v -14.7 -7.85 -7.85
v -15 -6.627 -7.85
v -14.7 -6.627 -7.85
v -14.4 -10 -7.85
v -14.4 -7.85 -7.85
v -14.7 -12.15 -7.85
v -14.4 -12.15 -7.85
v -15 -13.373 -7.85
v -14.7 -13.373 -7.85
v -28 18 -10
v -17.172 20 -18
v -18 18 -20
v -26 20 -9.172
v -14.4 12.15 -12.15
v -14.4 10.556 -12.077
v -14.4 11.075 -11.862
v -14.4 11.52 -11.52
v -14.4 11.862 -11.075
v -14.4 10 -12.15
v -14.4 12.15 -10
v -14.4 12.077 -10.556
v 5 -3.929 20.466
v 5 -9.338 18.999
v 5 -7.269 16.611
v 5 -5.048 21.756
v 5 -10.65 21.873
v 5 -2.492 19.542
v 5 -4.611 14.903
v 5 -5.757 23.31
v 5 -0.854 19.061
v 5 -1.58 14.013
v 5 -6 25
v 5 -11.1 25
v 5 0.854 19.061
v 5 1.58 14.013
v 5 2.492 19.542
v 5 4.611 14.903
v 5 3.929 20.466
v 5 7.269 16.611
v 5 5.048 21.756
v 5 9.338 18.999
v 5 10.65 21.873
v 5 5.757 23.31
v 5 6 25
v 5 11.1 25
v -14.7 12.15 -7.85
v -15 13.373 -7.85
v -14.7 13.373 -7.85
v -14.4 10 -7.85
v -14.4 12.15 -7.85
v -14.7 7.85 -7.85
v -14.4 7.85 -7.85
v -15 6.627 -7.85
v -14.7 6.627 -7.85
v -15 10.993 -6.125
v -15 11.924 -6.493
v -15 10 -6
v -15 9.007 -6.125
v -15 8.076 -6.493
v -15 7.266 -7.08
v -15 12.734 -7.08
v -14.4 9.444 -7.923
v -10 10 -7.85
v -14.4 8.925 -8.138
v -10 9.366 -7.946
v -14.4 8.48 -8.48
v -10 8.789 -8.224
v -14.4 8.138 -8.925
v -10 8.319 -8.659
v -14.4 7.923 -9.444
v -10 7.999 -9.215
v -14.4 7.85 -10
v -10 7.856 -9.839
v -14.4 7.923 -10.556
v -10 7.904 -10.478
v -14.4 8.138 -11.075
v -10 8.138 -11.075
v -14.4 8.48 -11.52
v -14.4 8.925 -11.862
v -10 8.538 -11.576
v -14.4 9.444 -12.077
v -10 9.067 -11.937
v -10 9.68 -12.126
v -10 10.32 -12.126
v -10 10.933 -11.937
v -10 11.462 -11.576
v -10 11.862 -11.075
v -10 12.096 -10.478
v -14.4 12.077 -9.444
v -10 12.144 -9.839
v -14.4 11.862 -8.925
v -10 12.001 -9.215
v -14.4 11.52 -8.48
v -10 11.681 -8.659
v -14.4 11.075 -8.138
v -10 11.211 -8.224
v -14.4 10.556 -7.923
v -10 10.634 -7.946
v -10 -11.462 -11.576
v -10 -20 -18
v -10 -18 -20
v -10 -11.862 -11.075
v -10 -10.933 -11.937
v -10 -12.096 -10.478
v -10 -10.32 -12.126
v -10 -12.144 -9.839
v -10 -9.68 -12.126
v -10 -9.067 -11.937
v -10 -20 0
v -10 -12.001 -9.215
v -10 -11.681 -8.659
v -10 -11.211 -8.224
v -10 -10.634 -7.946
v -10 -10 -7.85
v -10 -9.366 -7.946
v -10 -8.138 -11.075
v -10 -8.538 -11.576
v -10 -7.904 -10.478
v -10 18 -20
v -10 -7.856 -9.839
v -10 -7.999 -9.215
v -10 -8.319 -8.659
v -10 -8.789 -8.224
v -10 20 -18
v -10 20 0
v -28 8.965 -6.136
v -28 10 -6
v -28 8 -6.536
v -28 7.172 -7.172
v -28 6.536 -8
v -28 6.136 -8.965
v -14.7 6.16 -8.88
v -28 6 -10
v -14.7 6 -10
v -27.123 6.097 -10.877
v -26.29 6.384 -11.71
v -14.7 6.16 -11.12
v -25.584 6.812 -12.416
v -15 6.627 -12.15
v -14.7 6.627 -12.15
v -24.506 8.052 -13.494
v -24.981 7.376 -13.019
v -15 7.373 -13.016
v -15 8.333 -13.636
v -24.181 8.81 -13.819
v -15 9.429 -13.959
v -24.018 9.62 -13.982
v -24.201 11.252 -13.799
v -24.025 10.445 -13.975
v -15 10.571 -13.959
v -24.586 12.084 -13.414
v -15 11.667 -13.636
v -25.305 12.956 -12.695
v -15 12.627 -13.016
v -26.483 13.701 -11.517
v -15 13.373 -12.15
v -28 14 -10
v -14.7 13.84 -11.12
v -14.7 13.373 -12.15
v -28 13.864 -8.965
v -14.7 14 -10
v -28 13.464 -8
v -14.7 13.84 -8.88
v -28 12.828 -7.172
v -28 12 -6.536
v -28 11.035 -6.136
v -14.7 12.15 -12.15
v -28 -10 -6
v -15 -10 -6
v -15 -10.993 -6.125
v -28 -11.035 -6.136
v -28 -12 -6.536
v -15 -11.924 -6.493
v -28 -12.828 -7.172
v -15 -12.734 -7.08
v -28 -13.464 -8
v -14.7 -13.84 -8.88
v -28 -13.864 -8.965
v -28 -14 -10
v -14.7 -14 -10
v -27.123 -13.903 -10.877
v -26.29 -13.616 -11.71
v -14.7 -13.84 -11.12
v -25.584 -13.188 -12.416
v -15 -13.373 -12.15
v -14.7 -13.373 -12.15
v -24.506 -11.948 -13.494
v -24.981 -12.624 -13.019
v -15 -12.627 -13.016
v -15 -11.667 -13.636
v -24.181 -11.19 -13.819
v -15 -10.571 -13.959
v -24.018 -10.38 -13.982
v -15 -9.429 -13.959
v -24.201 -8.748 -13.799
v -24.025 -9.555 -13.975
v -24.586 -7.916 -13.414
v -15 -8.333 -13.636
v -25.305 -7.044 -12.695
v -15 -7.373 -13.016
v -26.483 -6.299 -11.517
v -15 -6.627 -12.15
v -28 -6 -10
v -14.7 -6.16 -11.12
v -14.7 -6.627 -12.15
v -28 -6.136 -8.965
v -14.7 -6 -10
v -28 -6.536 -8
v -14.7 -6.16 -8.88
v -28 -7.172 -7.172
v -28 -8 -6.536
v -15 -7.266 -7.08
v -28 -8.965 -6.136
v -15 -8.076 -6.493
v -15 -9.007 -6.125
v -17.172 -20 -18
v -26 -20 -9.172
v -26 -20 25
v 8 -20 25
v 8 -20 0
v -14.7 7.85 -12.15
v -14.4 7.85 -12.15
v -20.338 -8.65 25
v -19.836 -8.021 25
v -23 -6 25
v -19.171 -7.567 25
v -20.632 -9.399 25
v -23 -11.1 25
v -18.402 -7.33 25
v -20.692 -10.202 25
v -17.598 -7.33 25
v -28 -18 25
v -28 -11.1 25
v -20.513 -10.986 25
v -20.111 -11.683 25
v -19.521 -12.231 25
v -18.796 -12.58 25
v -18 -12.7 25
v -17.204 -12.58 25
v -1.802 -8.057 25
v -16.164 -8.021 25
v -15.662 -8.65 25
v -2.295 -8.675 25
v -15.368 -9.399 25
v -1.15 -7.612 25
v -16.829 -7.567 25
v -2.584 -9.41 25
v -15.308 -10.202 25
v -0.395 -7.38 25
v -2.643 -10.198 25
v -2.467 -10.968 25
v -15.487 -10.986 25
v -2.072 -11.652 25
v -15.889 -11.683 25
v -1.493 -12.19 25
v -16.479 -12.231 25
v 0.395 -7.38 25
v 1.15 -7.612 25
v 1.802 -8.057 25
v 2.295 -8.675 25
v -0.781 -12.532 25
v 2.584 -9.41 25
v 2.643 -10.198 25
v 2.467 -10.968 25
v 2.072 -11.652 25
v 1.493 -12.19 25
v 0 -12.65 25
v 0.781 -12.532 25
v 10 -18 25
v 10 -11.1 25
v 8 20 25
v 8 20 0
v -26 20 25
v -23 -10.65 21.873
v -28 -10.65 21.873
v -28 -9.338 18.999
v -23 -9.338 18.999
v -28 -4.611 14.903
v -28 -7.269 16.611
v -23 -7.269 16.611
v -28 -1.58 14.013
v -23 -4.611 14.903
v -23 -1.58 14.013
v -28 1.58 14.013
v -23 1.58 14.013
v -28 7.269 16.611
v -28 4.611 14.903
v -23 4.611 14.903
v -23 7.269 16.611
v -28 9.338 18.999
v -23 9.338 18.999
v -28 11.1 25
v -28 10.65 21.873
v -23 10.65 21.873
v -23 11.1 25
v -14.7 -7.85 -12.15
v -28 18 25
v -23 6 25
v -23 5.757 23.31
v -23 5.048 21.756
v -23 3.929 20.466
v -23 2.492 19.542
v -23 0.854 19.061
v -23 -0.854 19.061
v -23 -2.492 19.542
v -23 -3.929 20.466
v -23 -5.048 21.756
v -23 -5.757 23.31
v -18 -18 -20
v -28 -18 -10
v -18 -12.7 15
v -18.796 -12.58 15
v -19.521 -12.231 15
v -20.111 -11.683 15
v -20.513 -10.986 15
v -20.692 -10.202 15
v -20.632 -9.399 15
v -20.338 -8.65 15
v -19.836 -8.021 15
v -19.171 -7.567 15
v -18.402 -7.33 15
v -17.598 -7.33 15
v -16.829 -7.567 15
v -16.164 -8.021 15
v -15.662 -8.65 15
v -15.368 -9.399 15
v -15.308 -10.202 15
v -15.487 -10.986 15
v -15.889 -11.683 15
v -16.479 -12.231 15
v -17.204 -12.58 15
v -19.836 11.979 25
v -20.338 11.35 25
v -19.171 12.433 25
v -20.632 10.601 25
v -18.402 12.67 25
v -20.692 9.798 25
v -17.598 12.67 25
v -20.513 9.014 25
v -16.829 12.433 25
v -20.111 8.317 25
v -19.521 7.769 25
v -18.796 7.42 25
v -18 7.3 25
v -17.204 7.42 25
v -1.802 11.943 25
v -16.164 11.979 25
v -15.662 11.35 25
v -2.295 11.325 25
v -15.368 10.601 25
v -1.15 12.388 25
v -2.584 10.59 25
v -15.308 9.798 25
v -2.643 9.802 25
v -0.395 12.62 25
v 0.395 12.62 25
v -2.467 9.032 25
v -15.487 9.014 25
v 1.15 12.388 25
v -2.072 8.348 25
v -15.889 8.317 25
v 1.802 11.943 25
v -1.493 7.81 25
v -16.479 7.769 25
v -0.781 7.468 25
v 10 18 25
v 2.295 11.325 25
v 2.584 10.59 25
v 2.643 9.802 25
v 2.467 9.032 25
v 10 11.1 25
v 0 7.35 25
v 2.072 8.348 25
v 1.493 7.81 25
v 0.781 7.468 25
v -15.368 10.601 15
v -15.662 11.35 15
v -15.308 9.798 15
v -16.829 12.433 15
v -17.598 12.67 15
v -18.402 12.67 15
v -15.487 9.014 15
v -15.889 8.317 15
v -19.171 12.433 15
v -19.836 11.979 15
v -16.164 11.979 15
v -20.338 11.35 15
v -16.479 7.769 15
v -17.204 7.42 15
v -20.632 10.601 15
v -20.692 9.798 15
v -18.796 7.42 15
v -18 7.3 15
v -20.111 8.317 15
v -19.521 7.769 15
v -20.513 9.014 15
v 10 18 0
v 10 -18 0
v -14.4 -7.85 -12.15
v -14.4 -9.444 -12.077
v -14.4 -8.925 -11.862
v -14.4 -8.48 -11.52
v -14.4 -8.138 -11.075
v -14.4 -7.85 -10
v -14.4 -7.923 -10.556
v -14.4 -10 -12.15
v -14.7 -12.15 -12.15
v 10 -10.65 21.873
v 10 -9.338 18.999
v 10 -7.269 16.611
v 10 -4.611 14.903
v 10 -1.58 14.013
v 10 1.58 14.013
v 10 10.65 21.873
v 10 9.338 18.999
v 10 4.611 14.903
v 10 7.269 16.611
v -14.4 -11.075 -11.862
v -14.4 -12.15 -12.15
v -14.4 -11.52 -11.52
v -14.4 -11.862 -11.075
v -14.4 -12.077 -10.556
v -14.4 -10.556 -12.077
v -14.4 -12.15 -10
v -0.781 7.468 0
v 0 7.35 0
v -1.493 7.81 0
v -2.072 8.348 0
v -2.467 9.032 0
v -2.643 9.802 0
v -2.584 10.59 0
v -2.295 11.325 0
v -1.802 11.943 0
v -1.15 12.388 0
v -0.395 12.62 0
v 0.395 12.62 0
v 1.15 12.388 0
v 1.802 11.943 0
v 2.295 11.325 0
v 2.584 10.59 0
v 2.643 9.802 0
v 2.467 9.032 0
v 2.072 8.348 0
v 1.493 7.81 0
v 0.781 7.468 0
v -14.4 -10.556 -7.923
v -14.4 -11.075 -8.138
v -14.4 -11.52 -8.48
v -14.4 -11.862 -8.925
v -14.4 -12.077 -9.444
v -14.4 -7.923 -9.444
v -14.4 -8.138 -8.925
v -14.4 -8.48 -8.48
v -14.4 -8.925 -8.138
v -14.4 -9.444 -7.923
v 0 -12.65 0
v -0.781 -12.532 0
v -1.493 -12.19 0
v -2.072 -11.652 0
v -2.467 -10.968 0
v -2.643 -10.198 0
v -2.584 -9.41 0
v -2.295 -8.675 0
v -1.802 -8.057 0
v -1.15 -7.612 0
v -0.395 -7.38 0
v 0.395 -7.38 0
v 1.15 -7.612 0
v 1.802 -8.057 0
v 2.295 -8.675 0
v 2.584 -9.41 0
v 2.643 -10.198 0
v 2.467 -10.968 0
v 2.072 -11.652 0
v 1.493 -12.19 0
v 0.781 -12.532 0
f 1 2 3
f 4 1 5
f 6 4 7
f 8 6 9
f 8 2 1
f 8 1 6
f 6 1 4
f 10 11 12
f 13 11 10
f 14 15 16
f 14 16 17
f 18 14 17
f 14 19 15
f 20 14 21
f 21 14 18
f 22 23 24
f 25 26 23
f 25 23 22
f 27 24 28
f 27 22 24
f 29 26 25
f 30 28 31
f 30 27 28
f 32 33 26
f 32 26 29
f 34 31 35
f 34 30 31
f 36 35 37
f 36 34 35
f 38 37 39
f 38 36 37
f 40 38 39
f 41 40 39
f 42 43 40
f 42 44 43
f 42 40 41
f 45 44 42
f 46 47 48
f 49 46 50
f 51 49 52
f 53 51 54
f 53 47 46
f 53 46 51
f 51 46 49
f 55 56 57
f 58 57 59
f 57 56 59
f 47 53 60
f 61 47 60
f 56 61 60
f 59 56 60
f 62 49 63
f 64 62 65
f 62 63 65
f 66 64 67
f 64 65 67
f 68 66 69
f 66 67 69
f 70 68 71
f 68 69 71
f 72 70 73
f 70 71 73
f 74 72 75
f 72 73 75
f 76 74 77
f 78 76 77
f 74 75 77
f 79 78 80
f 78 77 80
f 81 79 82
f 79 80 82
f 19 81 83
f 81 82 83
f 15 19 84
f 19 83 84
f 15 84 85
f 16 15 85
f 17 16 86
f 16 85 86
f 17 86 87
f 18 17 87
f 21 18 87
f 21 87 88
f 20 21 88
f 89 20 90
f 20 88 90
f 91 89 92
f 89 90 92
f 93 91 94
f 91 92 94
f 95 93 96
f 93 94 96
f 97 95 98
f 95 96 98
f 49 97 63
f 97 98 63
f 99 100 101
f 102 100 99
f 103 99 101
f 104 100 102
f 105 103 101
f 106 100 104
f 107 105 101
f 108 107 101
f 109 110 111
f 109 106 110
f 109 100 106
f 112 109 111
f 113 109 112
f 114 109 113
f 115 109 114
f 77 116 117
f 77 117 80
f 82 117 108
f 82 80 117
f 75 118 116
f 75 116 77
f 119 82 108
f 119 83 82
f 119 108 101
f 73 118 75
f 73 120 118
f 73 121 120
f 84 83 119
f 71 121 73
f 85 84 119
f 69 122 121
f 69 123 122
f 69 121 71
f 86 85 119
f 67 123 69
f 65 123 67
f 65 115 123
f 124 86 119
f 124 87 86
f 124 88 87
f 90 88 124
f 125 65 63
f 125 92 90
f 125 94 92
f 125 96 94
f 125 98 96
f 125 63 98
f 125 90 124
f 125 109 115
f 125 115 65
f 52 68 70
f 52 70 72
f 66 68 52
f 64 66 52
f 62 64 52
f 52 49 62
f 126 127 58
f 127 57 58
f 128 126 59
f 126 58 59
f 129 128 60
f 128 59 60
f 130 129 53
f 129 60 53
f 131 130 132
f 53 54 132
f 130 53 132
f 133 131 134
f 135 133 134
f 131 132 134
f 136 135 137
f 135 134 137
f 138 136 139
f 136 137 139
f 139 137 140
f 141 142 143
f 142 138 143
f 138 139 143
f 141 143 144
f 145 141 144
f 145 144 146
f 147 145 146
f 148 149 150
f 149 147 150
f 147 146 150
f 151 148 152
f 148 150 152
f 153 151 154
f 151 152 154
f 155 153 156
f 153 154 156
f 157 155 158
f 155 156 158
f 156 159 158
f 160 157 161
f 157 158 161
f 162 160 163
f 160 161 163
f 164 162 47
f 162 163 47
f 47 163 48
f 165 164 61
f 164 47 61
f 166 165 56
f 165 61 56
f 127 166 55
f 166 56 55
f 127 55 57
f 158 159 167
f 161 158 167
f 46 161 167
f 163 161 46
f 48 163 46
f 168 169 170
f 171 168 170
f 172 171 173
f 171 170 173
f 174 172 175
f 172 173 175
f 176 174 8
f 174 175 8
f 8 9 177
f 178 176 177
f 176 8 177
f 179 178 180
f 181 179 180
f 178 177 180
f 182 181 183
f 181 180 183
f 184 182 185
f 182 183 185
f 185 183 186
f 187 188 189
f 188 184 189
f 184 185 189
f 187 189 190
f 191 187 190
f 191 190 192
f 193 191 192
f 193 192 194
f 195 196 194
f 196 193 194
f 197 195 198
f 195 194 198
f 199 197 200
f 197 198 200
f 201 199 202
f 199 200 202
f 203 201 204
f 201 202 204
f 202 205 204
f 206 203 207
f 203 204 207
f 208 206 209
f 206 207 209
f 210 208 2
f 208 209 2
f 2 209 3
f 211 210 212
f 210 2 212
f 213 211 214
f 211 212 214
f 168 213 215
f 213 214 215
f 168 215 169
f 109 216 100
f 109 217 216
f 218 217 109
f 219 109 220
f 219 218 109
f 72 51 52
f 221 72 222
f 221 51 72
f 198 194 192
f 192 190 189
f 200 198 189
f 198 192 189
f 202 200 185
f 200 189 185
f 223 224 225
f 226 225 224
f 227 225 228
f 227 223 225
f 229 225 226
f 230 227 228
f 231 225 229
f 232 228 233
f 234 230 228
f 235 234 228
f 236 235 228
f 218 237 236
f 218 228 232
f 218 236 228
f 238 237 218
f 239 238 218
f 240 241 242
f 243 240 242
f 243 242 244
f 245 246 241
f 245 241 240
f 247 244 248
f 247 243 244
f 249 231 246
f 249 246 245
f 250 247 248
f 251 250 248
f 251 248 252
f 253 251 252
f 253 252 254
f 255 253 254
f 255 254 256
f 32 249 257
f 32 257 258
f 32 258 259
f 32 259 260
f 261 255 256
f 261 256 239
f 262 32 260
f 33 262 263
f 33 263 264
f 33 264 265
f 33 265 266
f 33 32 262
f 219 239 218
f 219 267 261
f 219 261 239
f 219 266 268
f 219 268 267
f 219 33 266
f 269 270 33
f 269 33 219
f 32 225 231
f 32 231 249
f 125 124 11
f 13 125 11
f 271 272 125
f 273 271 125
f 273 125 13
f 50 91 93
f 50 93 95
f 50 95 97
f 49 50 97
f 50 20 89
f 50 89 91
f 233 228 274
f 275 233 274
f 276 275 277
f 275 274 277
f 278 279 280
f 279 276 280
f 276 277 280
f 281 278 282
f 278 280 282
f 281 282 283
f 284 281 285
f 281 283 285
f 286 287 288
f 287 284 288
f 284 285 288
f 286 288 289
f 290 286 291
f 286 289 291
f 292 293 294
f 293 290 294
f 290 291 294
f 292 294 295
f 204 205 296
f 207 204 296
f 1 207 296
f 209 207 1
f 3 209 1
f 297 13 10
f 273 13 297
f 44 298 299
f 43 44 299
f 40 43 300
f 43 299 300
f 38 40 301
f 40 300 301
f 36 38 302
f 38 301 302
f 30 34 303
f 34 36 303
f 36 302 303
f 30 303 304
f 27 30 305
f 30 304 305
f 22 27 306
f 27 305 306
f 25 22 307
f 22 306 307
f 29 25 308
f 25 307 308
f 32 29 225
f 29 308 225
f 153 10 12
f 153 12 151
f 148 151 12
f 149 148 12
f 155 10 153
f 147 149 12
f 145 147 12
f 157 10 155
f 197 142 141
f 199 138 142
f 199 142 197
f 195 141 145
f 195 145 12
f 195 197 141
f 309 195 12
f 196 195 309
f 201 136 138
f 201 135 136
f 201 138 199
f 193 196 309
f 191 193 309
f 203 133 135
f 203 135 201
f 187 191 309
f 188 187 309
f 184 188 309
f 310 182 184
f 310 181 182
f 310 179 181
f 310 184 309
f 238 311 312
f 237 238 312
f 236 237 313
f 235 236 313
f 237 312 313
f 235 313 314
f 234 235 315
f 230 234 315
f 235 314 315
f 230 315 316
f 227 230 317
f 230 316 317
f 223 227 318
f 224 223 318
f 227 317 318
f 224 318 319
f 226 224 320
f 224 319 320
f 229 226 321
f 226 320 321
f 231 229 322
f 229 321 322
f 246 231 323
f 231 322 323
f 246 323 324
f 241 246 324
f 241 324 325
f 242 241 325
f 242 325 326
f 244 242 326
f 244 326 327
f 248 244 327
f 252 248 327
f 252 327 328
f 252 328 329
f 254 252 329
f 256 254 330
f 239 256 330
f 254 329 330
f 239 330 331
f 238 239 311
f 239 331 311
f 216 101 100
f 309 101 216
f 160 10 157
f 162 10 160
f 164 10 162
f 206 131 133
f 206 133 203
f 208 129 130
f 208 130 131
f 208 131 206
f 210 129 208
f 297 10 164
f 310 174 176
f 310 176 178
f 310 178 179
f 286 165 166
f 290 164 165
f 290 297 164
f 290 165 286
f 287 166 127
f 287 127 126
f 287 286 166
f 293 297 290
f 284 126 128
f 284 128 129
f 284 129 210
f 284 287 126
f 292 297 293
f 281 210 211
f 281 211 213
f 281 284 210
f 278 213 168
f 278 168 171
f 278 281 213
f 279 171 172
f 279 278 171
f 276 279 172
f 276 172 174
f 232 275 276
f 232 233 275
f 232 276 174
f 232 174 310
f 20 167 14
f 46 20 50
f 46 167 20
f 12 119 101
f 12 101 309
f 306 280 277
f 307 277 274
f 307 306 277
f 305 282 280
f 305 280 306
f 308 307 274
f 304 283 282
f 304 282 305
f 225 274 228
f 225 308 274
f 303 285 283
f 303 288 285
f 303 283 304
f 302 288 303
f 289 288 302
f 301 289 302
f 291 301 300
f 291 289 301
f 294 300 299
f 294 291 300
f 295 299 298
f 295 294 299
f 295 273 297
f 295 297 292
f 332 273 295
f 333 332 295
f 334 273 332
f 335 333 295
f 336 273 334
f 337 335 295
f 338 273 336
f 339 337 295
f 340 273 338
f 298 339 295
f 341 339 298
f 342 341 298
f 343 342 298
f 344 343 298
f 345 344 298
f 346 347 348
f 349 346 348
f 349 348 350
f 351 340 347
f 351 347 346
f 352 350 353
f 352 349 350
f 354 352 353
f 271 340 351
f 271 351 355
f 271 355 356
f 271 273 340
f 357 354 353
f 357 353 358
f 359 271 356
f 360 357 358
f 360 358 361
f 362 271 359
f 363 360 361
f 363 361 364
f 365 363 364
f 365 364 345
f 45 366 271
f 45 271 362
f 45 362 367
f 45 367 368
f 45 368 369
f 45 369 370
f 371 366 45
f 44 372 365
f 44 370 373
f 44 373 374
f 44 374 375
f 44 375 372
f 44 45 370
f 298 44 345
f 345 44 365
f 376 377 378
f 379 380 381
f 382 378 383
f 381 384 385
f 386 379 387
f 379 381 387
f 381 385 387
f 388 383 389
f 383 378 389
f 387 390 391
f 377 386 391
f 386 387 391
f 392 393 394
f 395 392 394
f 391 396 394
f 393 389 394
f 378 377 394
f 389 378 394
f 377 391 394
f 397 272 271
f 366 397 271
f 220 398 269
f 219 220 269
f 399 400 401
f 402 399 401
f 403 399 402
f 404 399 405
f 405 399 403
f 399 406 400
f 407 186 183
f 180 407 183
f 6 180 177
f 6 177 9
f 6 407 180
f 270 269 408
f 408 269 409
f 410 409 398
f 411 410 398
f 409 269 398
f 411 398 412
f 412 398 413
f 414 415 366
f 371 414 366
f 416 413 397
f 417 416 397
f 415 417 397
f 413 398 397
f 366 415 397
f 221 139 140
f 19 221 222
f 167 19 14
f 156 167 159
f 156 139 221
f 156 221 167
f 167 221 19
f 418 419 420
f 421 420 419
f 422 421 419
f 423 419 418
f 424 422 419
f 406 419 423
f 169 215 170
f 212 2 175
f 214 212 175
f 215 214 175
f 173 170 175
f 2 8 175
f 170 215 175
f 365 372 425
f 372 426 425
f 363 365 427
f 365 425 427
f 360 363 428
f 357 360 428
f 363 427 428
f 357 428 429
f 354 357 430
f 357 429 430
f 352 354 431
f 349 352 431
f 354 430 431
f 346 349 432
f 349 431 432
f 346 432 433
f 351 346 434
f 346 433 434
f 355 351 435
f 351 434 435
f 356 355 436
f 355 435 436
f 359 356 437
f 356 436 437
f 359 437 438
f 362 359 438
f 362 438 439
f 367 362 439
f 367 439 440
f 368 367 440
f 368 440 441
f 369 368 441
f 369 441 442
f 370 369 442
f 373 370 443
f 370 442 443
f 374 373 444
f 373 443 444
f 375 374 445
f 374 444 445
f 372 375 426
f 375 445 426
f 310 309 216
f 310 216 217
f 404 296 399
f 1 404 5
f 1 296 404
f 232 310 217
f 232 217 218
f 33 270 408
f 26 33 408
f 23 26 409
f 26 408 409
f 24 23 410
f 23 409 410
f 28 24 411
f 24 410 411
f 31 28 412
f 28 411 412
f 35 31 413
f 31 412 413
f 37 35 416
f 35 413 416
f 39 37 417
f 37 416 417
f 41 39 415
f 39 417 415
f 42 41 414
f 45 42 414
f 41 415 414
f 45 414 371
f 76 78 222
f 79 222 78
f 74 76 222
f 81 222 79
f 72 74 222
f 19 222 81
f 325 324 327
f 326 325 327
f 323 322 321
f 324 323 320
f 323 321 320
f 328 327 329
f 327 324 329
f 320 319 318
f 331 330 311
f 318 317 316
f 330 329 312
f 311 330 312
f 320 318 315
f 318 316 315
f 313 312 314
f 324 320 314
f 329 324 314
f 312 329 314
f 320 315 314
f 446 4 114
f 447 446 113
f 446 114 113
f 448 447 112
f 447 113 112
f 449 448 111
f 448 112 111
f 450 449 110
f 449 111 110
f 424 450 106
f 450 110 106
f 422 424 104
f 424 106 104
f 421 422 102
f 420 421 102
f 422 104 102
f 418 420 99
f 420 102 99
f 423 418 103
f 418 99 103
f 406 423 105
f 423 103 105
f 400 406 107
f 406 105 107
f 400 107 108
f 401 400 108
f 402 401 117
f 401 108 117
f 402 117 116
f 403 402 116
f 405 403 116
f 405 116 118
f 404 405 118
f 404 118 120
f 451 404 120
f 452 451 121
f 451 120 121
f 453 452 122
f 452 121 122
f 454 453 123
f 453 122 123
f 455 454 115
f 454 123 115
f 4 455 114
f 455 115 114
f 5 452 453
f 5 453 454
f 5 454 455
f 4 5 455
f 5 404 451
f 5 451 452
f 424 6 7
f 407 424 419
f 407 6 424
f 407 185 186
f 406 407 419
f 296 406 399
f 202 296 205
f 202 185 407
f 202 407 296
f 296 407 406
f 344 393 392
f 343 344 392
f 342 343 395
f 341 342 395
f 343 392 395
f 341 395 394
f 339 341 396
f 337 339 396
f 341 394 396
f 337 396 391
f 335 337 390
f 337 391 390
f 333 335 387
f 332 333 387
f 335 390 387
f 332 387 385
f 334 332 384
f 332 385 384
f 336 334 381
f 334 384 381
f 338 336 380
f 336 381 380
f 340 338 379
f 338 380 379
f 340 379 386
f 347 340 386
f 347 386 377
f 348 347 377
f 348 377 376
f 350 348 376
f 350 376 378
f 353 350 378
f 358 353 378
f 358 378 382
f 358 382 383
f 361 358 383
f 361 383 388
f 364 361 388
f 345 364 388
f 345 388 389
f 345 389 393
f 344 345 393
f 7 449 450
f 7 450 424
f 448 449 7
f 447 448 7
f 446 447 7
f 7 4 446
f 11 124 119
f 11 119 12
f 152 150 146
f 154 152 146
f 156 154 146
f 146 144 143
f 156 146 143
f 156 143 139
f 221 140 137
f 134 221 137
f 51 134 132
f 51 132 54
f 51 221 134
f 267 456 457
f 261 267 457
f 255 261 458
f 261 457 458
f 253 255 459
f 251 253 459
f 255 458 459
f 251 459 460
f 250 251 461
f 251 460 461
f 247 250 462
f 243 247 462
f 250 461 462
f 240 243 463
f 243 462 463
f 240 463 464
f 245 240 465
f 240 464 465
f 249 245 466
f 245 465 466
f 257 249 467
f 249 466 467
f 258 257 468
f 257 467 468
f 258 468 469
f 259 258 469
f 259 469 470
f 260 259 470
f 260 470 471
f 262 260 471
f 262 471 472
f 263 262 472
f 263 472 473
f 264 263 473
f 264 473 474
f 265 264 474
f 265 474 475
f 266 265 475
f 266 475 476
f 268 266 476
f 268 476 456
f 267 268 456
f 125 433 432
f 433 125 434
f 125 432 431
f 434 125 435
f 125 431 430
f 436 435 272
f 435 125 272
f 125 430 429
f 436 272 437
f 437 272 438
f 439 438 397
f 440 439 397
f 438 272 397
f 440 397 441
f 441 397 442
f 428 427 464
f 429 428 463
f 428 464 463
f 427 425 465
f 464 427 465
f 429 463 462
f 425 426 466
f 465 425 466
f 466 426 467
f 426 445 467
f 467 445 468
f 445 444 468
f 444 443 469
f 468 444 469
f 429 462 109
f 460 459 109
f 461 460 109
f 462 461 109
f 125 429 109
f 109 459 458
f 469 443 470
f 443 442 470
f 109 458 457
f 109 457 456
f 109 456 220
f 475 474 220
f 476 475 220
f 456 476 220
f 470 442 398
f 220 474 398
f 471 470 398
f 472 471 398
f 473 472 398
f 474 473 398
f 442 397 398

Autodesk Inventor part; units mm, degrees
ref_plane "YZ Plane" through (0, 0, 0) normal (1, 0, 0) x (0, 1, 0)
ref_plane "XZ Plane" through (0, 0, 0) normal (0, 1, 0) x (-1, 0, 0)
ref_plane "XY Plane" through (0, 0, 0) normal (0, 0, 1) x (1, 0, 0)
sketch "スケッチ1" plane through (0, 0, 0) normal (0, 0, 1) x (1, 0, 0)
  line L0 (-10, -20) -> (10, -20)
  line L1 (10, -20) -> (10, 20)
  line L2 (10, 20) -> (-10, 20)
  line L3 (-10, 20) -> (-10, -20)
  line L4 (-10, -20) -> (10, 20) construction
  line L5 (10, -20) -> (-10, 20) construction
  point P0 (0, 0)
  dimension "d0" = 20
  dimension "d1" = 40
extrude "押し出し1" add sketch "スケッチ1" along normal blind 25
sketch "スケッチ2" plane through (10, -20, 0) normal (1, 0, 0) x (0, 0, -1)
  circle A0 centre (-25, 20) radius 11.1
  line L0 (0, 40) -> (-25, 40) projected
  dimension "d4" = 22.2
  dimension "d7" = 20
extrude "押し出し2" cut sketch "スケッチ2" against normal through all
sketch "スケッチ7" plane through (0, 0, 0) normal (1, 0, 0) x (0, 1, 0)
  arc A0 (-11.1, 25) -> (11.1, 25) centre (0, 25) ccw projected
  line L0 (20, 25) -> (11.1, 25) projected
  line L1 (20, 0) -> (20, 25) projected
  line L2 (20, 0) -> (-20, 0) projected
  line L3 (-20, 0) -> (-20, 25) projected
  line L4 (-11.1, 25) -> (-20, 25) projected
  circle A1 centre (0, 25) radius 6
  arc A2 (-11.1, 25) -> (11.1, 25) centre (0, 25) ccw projected
  line L5 (11.1, 25) -> (-11.1, 25)
  point P0 (0, 0)
  point P1 (-6, 25)
  point P2 (6, 25)
  dimension "d27" = 12
extrude "押し出し5" add sketch "スケッチ7" along normal mid plane 10 contours L5 A1 A0
sketch "スケッチ5" plane through (0, 0, 25) normal (0, 0, 1) x (1, 0, 0)
  line L0 (10, 20) -> (-10, 20) projected
  line L1 (-10, -20) -> (10, -20) projected
  point P0 (0, 0)
  point P1 (0, 10)
  point P2 (0, -10)
  dimension "d18" = 10
  dimension "d19" = 10
hole "穴1" at (0, 10, 25) at (0, -10, 25) direction (0, 0, -1) diameter 5.3 depth 58
sketch "Sketch9" plane through (-10, -20, 0) normal (-1, 0, 0) x (0, 0, 1)
  arc A0 (25, 31.1) -> (25, 8.9) centre (25, 20) ccw projected
  line L0 (25, 40) -> (25, 31.1) projected
  line L1 (0, 40) -> (25, 40) projected
  line L2 (0, 40) -> (0, 0) projected
  line L3 (0, 0) -> (25, 0) projected
  line L4 (25, 8.9) -> (25, 0) projected
  point P0 (0, 20)
extrude "Extrusion7" add sketch "Sketch9" along normal blind 18
sketch "Sketch10" plane through (0, 0, 0) normal (0, 0, -1) x (-1, 0, 0)
  circle A0 centre (0, 10) radius 2.65 projected
  circle A1 centre (0, -10) radius 2.65 projected
  line L0 (28, -20) -> (-10, -20) projected
  line L1 (28, 20) -> (28, -20) projected
  line L2 (-10, 20) -> (28, 20) projected
  line L3 (-10, -20) -> (-10, 20) projected
  line L4 (-10, -20) -> (-10, -11.1) projected
  line L5 (-10, 20) -> (28, 20) projected
  line L6 (-10, -20) -> (10, -20)
  line L7 (10, -20) -> (10, 20)
  line L8 (10, 20) -> (-10, 20)
  line L9 (-10, 20) -> (-10, -20)
  point P0 (0, 0)
  dimension "d34" = 20
extrude "Extrusion8" add sketch "Sketch10" along normal blind 20 contours L0 L7 L2 L1
sketch "Sketch11" plane through (-5, 0, 0) normal (-1, 0, 0) x (0, 0, 1)
  line L0 (0, 7.35) -> (25, 7.35) projected
  line L1 (25, -11.1) -> (25, -6) projected
  arc A0 (25, 6) -> (25, -6) centre (25, 0) ccw projected
  line L2 (25, 6) -> (25, 11.1) projected
  arc A1 (25, 11.1) -> (25, -11.1) centre (25, 0) ccw projected
  point P0 (0, 0)
extrude "Extrusion9" add sketch "Sketch11" along normal blind 18
chamfer "Chamfer2" distance 10 angle 45 1 edges at (-28, 0, -20)
sketch "Sketch12" plane through (0, 0, 25) normal (0, 0, 1) x (1, 0, 0)
  line L0 (10, -20) -> (10, -11.1) projected
  circle A0 centre (0, -10) radius 2.65 projected
  line L1 (10, -11.1) -> (5, -11.1) projected
  line L2 (5, -6) -> (5, -11.1) projected
  line L3 (5, -6) -> (-23, -6) projected
  line L4 (-23, -11.1) -> (-23, -6) projected
  line L5 (-23, -11.1) -> (-28, -11.1) projected
  line L6 (-28, -20) -> (-28, -11.1) projected
  line L7 (10, -20) -> (-28, -20) projected
  line L8 (10, -20) -> (10, -11.1) projected
  circle A1 centre (0, 10) radius 2.65 projected
  line L9 (-28, 11.1) -> (-23, 11.1) projected
  line L10 (-23, 6) -> (-23, 11.1) projected
  line L11 (-23, 6) -> (5, 6) projected
  line L12 (5, 11.1) -> (5, 6) projected
  line L13 (5, 11.1) -> (10, 11.1) projected
  line L14 (10, 11.1) -> (10, 20) projected
  line L15 (10, 20) -> (-28, 20) projected
  line L16 (-28, 11.1) -> (-28, 20) projected
  point P0 (0, 0)
  point P1 (-18, -10)
  point P2 (-18, 10)
  dimension "d42" = 28
hole "Hole2" at (-18, -10, 25) at (-18, 10, 25) direction (0, 0, -1) diameter 5.4 depth 10
chamfer "Chamfer3" distance 2 angle 45 8 edges at (10, -20, 12.5) (10, 20, 12.5) (-28, -20, 7.5) (-28, 20, 7.5) (-23, 20, -15) (-23, -20, -15) (-14, 20, -20) (-14, -20, -20)
sketch "スケッチ13" plane through (-28, -20, 0) normal (-1, 0, 0) x (0, 0, 1)
  line L0 (-20, 38) -> (-10, 38) projected
  line L1 (-20, 38) -> (-20, 2) projected
  line L2 (-10, 2) -> (-20, 2) projected
  line L3 (-10, 2) -> (-10, 38) projected
  line L4 (-9.1716, 0) -> (25, 0) projected
  line L5 (25, 0) -> (25, 2) projected
  line L6 (25, 2) -> (-10, 2) projected
  line L7 (-9.1716, 0) -> (-10, 2) projected
  line L8 (-10, 38) -> (25, 38) projected
  line L9 (25, 38) -> (25, 40) projected
  line L10 (25, 40) -> (-9.1716, 40) projected
  line L11 (-9.1716, 40) -> (-10, 38) projected
  point P0 (0, 20)
  point P1 (-10, 10)
  point P2 (-10, 30)
  dimension "d53" = 10
  dimension "d54" = 10
hole "穴3" at (-28, -10, -10) at (-28, 10, -10) direction (1, 0, 0) diameter 4.3 end through all counterbore diameter 8 counterbore depth 13
sketch "スケッチ14" plane through (-15, -10, -10) normal (-1, 0, 0) x (0, 0, 1)
  circle A0 centre (0, 0) radius 2.15 projected
  circle A1 centre (0, 20) radius 4 projected
  circle A2 centre (0, 20) radius 2.15 projected
  line L0 (2.15, -2.15) -> (-2.15, -2.15)
  line L1 (-2.15, -2.15) -> (-2.15, 2.15)
  line L2 (-2.15, 2.15) -> (2.15, 2.15)
  line L3 (2.15, 2.15) -> (2.15, -2.15)
  line L4 (2.15, -2.15) -> (-2.15, 2.15) construction
  line L5 (-2.15, -2.15) -> (2.15, 2.15) construction
  line L6 (2.15, 17.85) -> (-2.15, 17.85)
  line L7 (-2.15, 17.85) -> (-2.15, 22.15)
  line L8 (-2.15, 22.15) -> (2.15, 22.15)
  line L9 (2.15, 22.15) -> (2.15, 17.85)
  line L10 (2.15, 17.85) -> (-2.15, 22.15) construction
  line L11 (-2.15, 17.85) -> (2.15, 22.15) construction
  circle A3 centre (0, 20) radius 2.15 projected
  point P0 (10, 10)
extrude "押し出し10" cut sketch "スケッチ14" against normal blind 0.6 contours A0 | L3 L0 A0 | A0 L2 L3 | A0 L1 L2 | L0 L1 A0 | A2 | L9 L6 A2 | A2 L8 L9 | A2 L7 L8 | L6 L7 A2
sketch "スケッチ15" plane through (-15, -10, -10) normal (-1, 0, 0) x (0, 0, 1)
  line L0 (2.15, -2.15) -> (-2.15, -2.15) projected
  line L1 (-2.15, 2.15) -> (2.15, 2.15) projected
  circle A0 centre (0, 0) radius 4 projected
  line L2 (-2.15, -16.7131) -> (2.15, -16.7131)
  line L3 (2.15, -16.7131) -> (2.15, 35.0465)
  line L4 (2.15, 35.0465) -> (-2.15, 35.0465)
  line L5 (-2.15, 35.0465) -> (-2.15, -16.7131)
  line L6 (-2.15, 17.85) -> (-2.15, 22.15) projected
  line L7 (-2.15, 22.15) -> (2.15, 22.15) projected
  line L8 (2.15, 22.15) -> (2.15, 17.85) projected
  line L9 (2.15, 17.85) -> (-2.15, 17.85) projected
  circle A1 centre (0, 20) radius 4 projected
  point P0 (10, 10)
  point P1 (-2.15, -3.3731)
  point P2 (2.15, -3.3731)
  point P3 (-2.15, 3.3731)
  point P4 (2.15, 3.3731)
  point P5 (2.15, 23.3731)
  point P6 (-2.15, 23.3731)
  point P7 (-2.15, 16.6269)
  point P8 (2.15, 16.6269)
extrude "押し出し11" cut sketch "スケッチ15" against normal blind 0.3 contours L3 A0 L5 L0 | L1 L5 A0 L3 | A1 L5 L9 L3 | A1 L3 L7 L5
properties part number "Print_Parts_L" material "PC/ABS プラスチック"
